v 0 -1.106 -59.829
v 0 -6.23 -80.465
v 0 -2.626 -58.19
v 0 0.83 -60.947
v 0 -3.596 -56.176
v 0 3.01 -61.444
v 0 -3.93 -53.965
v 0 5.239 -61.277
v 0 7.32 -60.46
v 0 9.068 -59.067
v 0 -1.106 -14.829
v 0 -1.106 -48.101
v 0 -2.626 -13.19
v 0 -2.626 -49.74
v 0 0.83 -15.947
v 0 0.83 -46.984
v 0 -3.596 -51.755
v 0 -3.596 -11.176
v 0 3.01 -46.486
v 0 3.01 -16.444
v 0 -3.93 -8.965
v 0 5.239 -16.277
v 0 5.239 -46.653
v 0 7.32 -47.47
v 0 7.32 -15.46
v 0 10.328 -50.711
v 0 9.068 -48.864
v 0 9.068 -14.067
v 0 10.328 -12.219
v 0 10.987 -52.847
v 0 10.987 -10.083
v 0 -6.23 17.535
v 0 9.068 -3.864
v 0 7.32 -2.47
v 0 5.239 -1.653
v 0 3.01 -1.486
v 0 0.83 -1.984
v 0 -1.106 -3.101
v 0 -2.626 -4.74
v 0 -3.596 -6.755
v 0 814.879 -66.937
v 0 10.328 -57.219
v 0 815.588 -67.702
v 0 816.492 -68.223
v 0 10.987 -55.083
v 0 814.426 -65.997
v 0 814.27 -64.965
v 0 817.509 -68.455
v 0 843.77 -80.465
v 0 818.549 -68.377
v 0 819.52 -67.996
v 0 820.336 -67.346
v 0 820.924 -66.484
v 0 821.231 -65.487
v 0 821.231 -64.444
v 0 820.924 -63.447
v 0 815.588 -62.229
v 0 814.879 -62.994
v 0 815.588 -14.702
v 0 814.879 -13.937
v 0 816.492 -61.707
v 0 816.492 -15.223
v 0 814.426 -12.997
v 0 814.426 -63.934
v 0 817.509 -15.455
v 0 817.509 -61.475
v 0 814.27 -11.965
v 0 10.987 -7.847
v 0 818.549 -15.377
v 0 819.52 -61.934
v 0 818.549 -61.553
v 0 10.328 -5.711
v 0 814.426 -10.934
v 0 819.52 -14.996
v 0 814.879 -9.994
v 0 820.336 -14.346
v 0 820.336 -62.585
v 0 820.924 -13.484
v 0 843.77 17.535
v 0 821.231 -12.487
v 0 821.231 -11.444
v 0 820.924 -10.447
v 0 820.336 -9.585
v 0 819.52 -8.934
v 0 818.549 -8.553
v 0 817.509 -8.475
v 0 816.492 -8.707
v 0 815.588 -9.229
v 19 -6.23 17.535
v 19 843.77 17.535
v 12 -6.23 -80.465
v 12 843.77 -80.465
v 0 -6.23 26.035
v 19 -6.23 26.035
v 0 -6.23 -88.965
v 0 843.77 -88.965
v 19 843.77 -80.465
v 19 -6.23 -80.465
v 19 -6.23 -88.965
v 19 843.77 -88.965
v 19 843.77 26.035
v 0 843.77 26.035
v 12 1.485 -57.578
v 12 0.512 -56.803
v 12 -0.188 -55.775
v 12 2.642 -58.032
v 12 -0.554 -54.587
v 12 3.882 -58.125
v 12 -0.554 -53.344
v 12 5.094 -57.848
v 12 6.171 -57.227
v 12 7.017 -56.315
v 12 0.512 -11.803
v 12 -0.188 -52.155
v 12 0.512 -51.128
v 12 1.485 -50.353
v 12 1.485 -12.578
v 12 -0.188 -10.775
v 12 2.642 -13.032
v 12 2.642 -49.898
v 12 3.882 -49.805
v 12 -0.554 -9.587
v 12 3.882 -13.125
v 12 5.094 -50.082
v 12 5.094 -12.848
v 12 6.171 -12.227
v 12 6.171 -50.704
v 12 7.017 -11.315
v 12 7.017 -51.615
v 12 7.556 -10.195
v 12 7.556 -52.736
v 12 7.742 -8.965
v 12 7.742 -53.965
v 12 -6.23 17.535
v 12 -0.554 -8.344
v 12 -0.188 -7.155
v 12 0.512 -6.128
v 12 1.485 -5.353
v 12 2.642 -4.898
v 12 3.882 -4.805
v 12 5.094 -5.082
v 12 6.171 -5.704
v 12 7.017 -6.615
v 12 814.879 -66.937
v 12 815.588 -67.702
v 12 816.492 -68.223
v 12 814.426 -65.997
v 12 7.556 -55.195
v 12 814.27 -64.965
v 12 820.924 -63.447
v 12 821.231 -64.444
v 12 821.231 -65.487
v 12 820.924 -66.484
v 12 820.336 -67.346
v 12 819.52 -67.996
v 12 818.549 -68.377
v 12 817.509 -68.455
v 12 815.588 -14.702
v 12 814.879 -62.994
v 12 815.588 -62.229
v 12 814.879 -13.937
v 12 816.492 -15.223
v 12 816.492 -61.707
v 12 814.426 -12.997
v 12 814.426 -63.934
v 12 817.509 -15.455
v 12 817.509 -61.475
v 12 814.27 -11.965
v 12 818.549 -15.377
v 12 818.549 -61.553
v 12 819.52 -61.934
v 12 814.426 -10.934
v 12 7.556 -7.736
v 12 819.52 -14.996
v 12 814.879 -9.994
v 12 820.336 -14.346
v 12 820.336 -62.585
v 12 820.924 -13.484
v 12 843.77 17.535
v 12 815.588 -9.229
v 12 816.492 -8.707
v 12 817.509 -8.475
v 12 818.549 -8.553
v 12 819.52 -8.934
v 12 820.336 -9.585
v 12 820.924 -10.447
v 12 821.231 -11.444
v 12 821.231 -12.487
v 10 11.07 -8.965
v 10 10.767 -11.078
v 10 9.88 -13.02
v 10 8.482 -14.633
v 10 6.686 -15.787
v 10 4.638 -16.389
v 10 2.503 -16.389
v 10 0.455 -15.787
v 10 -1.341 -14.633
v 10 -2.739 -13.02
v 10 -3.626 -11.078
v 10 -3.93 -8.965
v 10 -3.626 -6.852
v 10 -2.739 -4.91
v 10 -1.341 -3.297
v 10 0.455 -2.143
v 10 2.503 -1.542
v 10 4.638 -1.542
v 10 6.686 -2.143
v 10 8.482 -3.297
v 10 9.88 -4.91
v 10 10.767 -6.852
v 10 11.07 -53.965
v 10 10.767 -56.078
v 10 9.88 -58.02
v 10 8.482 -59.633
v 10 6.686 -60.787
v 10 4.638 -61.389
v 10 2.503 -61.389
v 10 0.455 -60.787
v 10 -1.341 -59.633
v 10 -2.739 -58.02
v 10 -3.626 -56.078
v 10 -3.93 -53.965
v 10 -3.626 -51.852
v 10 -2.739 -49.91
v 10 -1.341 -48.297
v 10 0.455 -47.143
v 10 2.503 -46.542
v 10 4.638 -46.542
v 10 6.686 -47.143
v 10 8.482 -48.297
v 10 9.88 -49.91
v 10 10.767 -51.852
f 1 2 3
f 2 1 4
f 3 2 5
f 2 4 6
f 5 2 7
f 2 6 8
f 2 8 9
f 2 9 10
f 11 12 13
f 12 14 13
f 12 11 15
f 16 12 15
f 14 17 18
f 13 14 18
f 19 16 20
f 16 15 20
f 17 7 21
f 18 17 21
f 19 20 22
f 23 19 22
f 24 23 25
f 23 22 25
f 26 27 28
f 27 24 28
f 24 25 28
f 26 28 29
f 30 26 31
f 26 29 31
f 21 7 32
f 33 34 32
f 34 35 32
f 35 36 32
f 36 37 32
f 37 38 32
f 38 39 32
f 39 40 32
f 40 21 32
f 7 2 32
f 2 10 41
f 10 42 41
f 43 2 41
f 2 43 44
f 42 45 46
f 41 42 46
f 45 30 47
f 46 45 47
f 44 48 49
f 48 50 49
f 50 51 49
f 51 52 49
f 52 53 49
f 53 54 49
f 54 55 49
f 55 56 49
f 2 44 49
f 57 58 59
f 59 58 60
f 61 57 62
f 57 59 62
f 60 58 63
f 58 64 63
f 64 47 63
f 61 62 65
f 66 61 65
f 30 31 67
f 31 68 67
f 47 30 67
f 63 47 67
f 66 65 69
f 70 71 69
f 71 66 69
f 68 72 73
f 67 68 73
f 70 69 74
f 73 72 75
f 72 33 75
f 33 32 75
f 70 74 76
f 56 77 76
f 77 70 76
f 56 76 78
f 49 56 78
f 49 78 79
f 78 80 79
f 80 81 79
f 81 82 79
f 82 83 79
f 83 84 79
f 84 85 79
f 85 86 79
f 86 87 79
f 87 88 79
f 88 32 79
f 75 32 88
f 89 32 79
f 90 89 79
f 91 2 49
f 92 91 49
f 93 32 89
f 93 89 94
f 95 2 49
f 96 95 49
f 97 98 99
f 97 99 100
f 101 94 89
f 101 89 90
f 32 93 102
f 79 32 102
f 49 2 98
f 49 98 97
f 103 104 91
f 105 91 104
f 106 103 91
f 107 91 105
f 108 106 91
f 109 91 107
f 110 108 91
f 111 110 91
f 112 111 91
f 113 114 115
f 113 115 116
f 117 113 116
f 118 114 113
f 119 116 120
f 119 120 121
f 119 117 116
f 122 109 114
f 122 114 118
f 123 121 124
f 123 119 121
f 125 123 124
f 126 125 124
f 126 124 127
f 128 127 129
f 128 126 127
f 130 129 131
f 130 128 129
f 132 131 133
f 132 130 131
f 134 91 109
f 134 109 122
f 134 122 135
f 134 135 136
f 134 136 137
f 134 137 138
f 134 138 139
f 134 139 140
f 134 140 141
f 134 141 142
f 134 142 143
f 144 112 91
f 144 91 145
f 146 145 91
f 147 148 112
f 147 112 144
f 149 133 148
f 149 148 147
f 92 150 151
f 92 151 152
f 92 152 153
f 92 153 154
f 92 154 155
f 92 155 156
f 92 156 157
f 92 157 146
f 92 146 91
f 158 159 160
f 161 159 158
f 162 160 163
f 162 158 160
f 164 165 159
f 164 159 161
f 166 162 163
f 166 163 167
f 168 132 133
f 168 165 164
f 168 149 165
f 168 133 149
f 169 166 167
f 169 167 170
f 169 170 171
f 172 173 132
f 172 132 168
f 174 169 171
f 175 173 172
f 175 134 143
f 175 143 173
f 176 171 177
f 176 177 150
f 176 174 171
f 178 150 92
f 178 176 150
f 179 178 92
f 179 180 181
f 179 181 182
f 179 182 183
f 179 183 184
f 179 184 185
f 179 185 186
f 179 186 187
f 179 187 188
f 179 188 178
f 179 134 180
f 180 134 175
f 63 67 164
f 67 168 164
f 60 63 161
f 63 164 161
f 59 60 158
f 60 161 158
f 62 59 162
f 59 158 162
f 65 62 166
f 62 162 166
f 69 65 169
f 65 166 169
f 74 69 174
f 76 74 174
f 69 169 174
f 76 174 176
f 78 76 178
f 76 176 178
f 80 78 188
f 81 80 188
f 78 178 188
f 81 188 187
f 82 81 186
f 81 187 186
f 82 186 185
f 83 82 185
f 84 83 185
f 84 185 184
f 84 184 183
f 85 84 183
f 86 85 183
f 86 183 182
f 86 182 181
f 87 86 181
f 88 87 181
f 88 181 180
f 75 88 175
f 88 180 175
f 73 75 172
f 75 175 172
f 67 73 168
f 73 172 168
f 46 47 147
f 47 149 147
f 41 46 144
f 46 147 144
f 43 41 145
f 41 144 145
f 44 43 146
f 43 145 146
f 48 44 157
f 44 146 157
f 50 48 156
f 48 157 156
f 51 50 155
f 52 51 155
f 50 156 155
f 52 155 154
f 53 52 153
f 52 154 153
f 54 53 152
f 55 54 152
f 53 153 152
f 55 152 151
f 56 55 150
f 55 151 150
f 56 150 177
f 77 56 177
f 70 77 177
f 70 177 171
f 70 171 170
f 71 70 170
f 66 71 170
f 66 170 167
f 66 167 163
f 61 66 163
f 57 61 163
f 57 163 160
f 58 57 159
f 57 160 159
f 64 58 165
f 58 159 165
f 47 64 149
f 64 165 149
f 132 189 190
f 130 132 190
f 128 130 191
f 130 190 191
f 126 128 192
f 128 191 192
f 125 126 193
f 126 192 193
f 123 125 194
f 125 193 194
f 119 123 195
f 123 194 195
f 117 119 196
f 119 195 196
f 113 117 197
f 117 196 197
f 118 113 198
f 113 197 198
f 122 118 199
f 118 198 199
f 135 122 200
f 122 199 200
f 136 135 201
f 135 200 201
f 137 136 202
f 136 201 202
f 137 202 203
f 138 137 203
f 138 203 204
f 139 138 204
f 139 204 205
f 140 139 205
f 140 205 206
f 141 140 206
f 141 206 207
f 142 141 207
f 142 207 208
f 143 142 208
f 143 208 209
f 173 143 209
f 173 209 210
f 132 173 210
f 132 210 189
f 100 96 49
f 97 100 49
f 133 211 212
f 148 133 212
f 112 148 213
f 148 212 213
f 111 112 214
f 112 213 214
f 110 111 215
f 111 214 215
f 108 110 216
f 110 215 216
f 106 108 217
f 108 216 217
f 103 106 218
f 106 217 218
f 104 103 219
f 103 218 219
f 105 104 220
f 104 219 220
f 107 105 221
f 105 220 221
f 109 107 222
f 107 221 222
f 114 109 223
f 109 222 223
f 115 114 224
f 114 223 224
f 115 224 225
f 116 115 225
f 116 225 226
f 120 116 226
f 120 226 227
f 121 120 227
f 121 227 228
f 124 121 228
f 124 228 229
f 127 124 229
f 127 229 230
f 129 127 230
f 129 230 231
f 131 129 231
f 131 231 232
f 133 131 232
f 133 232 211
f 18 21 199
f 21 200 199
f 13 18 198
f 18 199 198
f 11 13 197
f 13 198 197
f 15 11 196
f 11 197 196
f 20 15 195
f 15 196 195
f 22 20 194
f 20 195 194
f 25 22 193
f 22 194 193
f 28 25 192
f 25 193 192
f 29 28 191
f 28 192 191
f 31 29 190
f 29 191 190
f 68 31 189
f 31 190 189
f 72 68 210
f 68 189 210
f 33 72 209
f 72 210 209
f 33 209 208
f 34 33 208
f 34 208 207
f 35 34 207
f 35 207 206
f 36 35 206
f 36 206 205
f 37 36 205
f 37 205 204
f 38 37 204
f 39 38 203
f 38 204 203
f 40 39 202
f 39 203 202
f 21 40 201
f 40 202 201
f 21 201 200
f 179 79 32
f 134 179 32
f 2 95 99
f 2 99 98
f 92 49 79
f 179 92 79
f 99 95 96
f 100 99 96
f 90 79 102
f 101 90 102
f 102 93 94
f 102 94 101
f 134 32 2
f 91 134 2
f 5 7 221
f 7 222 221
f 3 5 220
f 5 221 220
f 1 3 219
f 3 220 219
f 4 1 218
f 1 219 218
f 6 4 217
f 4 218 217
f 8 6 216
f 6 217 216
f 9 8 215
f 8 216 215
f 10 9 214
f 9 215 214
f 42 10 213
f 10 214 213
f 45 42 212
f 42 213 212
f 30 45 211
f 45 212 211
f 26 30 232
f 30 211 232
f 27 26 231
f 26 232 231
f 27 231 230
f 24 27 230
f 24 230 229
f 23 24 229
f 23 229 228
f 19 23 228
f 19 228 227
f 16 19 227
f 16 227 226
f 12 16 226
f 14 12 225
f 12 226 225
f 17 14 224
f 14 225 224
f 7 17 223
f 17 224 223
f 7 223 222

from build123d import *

# Parameters (mm, degrees)
F0_W     = 850
F0_H     = 8.5
F1_DEPTH = 19
F0_W_2   = 26
F0_H_2   = 33.5
F2_DEPTH = 12
F3_D     = 7
F3_DEPTH = 12
F3_TIP   = 2.1030121666
F4_D     = 15
F4_DEPTH = 10
F4_TIP   = 4.5064546427


with BuildPart() as f1:
    # F0 (on Right) → F1 (new body)
    with BuildSketch(Plane.YZ):
        with Locations((418.7703758478, 21.7847777605)):
            Rectangle(F0_W, F0_H)
    extrude(amount=F1_DEPTH)


with BuildPart() as f1b:
    # F0 (on Right) → F1, piece 2 (new body)
    with BuildSketch(Plane.YZ):
        with Locations((418.7703758478, -84.7152222395)):
            Rectangle(F0_W, F0_H)
    extrude(amount=F1_DEPTH)


with BuildPart() as f2:
    # F0 (on Right) → F2 (new body)
    with BuildSketch(Plane.YZ):
        Polygon((843.7703758478, -31.4652222395), (843.7703758478, 17.5347777605), (-6.2296241522, 17.5347777605), (-6.2296241522, -8.9652222395), (-6.2296241522, -31.4652222395), (817.7703758478, -31.4652222395), align=None)
        Polygon((843.7703758478, -80.4652222395), (843.7703758478, -64.9652222395), (817.7703758478, -64.9652222395), (817.7703758478, -31.4652222395), (-6.2296241522, -31.4652222395), (-6.2296241522, -53.9652222395), (-6.2296241522, -80.4652222395), align=None)
        with Locations((830.7703758478, -48.2152222395)):
            Rectangle(F0_W_2, F0_H_2)
    extrude(amount=F2_DEPTH)

    # F3
    with Locations(Plane(origin=(0, 0, 0), x_dir=(0, 1, 0), z_dir=(-1, 0, 0))):
        with Locations((817.7703758478, 11.9652222395), (817.7703758478, 64.9652222395)):
            Hole(F3_D / 2, depth=F3_DEPTH)
            with Locations((0, 0, -(F3_DEPTH + F3_TIP / 2))):  # 118° drill point
                Cone(0, F3_D / 2, F3_TIP, mode=Mode.SUBTRACT)

    # F4
    with Locations(Plane(origin=(0, 0, 0), x_dir=(0, 1, 0), z_dir=(-1, 0, 0))):
        with Locations((3.5703758478, 53.9652222395), (3.5703758478, 8.9652222395)):
            Hole(F4_D / 2, depth=F4_DEPTH)
            with Locations((0, 0, -(F4_DEPTH + F4_TIP / 2))):  # 118° drill point
                Cone(0, F4_D / 2, F4_TIP, mode=Mode.SUBTRACT)


solid = Compound([f1.part, f1b.part, f2.part])
